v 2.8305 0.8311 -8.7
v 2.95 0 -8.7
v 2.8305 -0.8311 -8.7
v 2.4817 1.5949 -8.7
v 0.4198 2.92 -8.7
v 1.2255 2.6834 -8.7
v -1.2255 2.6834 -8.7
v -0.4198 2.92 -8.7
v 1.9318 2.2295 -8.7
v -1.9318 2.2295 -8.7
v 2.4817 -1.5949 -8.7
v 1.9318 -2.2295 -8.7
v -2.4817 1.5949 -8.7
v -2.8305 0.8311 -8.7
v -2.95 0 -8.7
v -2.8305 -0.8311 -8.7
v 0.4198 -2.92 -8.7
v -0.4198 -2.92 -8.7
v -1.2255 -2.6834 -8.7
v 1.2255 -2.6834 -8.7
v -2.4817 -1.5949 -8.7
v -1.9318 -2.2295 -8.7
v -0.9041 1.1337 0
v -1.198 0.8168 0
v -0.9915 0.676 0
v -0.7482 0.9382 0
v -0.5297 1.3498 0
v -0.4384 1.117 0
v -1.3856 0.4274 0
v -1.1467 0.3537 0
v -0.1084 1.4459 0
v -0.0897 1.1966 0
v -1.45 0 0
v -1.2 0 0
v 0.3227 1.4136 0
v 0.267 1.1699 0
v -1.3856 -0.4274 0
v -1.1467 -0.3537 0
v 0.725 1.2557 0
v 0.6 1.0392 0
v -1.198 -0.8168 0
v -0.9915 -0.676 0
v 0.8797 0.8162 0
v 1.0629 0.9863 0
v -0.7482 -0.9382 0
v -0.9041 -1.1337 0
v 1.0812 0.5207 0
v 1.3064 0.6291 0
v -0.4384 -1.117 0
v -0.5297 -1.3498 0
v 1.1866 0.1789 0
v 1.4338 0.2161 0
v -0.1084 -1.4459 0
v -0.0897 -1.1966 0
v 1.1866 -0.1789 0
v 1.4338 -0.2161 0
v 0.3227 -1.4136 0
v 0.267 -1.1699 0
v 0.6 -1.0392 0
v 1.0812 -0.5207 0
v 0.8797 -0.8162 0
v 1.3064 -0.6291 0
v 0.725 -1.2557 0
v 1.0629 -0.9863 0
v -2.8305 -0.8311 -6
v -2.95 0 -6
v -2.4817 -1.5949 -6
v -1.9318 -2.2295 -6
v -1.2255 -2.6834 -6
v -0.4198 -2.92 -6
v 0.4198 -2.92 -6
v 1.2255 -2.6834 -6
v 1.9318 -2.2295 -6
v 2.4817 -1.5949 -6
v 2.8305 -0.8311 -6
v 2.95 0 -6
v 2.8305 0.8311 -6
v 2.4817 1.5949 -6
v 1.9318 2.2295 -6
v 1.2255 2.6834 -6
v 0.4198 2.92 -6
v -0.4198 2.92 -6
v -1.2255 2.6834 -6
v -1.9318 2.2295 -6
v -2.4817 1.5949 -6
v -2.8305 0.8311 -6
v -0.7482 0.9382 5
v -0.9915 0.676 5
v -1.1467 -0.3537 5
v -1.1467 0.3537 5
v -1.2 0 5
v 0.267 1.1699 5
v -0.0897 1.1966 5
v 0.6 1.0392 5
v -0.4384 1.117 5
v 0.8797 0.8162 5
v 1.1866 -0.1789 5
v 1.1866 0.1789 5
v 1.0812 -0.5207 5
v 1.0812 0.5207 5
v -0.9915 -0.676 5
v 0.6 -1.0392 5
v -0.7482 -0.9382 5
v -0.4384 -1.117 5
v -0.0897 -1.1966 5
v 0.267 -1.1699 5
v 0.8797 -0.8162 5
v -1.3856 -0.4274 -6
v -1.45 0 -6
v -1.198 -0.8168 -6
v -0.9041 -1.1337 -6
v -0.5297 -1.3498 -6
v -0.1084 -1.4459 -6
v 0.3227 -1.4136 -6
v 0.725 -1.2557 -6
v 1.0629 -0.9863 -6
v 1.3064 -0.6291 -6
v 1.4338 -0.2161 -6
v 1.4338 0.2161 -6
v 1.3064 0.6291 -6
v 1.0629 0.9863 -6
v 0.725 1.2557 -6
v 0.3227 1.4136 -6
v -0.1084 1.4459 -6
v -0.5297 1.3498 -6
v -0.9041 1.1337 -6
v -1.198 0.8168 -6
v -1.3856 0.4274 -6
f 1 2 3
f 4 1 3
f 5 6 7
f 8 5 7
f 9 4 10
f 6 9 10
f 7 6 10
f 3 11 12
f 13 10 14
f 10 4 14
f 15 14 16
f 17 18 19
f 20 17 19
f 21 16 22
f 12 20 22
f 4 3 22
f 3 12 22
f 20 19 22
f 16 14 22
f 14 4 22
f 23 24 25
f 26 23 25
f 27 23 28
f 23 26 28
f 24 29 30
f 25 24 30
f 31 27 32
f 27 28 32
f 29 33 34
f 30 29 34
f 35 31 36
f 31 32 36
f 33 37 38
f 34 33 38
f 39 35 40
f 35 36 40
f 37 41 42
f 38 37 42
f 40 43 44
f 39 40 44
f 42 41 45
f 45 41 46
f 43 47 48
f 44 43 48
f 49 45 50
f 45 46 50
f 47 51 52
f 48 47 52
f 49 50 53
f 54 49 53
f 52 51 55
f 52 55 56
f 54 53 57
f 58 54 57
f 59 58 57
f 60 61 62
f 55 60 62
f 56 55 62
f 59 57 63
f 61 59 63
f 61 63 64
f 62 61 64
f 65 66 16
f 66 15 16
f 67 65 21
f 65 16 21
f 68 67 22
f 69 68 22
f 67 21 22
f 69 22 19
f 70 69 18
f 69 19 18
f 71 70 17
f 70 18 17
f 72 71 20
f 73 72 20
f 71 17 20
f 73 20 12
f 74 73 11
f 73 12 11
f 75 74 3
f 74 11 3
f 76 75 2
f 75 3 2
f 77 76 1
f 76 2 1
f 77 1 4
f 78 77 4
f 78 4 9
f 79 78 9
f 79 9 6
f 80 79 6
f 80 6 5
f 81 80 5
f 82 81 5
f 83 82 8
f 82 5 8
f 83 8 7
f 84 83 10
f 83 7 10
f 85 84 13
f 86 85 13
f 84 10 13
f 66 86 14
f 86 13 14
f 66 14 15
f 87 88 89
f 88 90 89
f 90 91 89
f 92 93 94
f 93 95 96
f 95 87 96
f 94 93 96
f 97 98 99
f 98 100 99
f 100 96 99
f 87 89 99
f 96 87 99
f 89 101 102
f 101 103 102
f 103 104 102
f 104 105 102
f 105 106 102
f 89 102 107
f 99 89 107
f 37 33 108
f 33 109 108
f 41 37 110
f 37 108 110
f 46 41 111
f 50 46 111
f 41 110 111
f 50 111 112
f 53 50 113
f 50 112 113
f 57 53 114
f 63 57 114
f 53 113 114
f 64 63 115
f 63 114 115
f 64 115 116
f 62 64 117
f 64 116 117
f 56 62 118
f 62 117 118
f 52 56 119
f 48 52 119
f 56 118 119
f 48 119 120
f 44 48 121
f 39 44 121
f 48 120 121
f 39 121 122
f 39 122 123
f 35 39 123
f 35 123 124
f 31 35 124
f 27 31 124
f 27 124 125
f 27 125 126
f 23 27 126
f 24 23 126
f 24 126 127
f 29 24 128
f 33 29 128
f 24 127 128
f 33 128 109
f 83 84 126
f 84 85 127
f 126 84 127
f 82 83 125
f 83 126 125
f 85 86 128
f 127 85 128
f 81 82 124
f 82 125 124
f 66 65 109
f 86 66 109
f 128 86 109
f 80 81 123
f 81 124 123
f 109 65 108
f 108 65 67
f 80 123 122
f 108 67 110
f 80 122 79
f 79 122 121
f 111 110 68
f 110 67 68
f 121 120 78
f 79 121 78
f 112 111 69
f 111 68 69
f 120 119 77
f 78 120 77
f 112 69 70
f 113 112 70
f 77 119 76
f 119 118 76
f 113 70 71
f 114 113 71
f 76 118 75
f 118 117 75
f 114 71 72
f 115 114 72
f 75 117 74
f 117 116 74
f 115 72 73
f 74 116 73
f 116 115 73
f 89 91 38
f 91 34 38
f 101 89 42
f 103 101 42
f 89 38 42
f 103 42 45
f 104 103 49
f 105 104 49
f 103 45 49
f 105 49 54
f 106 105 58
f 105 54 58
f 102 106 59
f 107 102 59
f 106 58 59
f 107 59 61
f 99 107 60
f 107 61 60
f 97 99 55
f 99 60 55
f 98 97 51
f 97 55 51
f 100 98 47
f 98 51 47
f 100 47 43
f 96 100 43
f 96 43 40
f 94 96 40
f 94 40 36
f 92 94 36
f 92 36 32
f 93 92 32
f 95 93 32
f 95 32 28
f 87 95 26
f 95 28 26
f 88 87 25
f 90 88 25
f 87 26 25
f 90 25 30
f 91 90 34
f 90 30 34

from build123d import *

# Parameters (mm, degrees)
SKETCH_1_W = 1.2
SKETCH_1_H = 5


with BuildPart() as part:
    # 草图1 → 旋转1 (revolve)
    with BuildSketch(Plane(origin=(0, 0, 0), x_dir=(1, 0, 0), z_dir=(0, 1, 0)), mode=Mode.PRIVATE) as revolve_1_sk:
        Polygon((0, 8.7), (0, 6), (1.45, 6), (2.95, 6), (2.95, 8.7), align=None)
        Polygon((0, 6), (0, 0), (1.2, 0), (1.45, 0), (1.45, 6), align=None)
        with Locations((0.6, -2.5)):
            Rectangle(SKETCH_1_W, SKETCH_1_H)
    revolve(revolve_1_sk.sketch.rotate(Axis((0, 0, -34.43030142), (0, 0, 1)), 180), axis=Axis((0, 0, -34.43030142), (0, 0, 1)))


solid = part.part
